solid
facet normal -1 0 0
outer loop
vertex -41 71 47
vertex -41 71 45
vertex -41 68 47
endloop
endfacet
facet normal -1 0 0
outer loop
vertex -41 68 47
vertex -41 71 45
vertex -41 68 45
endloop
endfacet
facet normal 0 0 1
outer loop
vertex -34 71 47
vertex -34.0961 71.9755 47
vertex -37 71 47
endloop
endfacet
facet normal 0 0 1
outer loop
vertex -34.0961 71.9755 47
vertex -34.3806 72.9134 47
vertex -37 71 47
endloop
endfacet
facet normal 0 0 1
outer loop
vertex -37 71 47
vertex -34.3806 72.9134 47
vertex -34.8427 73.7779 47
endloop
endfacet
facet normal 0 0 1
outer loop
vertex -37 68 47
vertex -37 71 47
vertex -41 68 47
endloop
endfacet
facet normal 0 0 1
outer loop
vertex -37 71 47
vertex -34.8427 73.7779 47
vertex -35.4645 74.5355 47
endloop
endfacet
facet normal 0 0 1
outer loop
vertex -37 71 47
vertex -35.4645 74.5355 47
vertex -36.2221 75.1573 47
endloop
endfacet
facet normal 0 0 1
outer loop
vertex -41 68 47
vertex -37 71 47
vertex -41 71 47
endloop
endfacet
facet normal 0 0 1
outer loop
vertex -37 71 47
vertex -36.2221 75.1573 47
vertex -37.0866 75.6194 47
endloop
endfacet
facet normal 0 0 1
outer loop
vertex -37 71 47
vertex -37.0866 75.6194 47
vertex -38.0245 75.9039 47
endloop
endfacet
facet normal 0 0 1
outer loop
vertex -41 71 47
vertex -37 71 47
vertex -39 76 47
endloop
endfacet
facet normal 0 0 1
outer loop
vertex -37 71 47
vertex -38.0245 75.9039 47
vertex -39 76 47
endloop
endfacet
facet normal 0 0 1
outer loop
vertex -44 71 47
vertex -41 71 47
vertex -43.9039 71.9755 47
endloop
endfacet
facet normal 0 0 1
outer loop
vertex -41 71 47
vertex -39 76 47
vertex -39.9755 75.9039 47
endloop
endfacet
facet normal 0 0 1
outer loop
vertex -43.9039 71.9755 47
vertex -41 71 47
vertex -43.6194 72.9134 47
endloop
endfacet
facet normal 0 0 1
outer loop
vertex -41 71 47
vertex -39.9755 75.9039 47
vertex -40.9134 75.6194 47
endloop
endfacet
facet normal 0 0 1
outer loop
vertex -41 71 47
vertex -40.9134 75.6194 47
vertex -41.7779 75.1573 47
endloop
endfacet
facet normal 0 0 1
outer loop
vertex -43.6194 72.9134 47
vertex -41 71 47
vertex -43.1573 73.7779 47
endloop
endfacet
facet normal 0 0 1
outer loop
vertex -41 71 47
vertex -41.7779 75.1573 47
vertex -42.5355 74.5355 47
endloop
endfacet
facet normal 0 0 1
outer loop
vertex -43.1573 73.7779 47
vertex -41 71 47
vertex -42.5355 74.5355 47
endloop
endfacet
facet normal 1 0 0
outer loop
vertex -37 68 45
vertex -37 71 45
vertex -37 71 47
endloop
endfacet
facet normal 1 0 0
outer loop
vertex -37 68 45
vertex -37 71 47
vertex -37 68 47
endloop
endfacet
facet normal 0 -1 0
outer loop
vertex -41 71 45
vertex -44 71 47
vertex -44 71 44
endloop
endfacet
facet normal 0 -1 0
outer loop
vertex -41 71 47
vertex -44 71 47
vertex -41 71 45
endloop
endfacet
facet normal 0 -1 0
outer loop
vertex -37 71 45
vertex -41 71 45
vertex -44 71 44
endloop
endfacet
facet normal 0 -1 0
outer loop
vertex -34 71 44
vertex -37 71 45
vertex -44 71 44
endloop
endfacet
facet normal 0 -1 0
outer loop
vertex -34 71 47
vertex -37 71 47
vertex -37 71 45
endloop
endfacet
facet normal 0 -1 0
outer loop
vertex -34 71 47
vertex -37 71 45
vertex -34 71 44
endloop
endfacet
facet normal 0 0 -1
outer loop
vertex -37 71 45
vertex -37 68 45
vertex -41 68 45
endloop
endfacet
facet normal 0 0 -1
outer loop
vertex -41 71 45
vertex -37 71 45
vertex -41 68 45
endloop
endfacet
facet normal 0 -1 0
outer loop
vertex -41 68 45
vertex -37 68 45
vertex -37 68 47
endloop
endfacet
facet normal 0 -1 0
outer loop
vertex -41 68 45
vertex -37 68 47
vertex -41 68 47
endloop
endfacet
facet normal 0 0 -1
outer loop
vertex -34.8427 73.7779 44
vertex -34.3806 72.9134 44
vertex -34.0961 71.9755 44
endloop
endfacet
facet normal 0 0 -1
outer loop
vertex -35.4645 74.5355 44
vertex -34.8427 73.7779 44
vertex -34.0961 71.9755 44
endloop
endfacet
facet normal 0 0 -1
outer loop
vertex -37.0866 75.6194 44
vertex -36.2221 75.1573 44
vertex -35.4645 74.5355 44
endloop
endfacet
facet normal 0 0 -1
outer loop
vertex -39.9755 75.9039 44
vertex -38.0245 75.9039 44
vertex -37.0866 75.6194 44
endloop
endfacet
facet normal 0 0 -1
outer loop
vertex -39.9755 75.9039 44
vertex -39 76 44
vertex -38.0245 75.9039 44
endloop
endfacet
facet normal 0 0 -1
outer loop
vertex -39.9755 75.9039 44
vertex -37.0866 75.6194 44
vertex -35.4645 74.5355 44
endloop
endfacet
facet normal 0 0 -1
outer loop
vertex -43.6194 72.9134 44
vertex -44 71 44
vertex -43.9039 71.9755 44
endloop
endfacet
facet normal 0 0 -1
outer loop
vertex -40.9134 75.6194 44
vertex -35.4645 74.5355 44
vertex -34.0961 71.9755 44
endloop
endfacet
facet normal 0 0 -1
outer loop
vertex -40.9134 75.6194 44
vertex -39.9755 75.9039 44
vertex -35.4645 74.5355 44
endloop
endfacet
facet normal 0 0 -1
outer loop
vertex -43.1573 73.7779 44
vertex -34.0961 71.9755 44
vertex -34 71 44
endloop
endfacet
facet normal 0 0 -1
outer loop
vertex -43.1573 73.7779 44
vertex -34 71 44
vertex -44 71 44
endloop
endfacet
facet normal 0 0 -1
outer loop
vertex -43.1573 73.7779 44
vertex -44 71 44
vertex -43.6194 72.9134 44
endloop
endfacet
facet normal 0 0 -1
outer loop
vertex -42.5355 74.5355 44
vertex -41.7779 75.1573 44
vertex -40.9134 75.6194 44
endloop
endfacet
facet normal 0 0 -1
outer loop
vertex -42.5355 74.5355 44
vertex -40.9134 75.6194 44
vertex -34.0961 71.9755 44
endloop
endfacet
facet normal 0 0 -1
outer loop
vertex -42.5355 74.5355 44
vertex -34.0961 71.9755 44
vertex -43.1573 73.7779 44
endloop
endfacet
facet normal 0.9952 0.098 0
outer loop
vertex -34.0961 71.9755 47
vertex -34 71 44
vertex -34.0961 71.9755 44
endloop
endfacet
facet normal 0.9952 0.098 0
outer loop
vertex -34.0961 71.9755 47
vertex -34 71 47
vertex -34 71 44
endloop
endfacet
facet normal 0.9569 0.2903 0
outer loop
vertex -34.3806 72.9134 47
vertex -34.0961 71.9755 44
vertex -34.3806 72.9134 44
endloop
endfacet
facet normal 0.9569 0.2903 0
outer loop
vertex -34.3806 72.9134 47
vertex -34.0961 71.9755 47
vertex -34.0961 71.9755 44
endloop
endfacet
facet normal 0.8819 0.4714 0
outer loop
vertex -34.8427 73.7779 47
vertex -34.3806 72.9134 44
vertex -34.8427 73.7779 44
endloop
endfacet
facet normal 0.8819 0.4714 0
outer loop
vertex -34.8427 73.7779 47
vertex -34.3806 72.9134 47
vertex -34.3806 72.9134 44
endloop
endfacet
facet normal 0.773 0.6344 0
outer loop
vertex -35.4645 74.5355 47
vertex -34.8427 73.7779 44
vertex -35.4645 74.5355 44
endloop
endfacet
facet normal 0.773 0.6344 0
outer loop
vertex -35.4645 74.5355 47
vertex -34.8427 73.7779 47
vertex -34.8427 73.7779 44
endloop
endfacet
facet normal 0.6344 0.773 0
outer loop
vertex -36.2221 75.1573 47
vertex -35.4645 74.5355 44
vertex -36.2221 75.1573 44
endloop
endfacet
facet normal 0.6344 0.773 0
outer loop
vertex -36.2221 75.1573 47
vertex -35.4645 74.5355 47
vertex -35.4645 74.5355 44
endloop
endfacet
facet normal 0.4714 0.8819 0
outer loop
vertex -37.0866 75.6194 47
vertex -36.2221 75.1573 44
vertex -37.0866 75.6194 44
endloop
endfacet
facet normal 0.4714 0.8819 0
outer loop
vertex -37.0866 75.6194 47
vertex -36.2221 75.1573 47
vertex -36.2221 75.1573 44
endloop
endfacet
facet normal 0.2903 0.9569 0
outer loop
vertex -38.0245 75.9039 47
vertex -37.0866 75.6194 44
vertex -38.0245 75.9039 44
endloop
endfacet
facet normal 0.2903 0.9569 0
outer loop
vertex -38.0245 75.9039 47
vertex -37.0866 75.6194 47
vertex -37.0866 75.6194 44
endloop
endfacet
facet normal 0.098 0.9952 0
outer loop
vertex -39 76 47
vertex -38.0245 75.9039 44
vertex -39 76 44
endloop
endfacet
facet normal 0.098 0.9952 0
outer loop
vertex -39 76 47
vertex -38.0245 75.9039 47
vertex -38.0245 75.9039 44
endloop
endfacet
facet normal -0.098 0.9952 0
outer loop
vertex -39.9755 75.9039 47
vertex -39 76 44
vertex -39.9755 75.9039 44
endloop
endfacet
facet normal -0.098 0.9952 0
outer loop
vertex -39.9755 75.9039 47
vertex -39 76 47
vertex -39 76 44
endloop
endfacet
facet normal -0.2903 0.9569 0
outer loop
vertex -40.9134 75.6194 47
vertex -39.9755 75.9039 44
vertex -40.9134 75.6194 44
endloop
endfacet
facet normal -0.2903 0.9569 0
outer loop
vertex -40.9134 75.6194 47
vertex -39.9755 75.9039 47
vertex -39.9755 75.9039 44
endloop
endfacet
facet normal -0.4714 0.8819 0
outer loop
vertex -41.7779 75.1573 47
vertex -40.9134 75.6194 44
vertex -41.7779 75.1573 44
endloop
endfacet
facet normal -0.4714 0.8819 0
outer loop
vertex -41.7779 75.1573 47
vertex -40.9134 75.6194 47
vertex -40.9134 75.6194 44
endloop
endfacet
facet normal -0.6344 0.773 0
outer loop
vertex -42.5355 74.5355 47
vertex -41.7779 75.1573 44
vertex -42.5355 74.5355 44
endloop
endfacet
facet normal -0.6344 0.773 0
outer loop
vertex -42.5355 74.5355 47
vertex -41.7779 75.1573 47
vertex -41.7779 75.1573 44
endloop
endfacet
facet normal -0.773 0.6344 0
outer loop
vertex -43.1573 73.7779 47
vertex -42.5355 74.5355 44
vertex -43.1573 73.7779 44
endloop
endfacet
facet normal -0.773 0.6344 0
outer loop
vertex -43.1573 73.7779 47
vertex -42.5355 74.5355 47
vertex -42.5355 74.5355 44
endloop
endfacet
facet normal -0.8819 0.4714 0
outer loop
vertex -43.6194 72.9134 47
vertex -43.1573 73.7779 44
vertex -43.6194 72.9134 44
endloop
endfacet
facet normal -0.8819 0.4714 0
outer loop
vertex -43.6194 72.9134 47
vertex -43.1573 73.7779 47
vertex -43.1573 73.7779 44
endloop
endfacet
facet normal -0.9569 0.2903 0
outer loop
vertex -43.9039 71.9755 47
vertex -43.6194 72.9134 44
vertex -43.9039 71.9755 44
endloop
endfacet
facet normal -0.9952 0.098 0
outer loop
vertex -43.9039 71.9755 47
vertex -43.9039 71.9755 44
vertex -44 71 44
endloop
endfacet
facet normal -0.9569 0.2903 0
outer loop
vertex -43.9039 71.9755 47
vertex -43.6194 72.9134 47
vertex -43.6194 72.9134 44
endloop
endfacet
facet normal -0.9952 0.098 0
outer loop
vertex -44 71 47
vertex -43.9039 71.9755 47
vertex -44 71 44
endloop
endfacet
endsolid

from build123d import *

# Parameters (mm, degrees)
CYLINDER048_W                = 5
CYLINDER048_H                = 3
CYLINDER048_ANGLE            = 180
BOX044_W                     = 4
BOX044_H                     = 5
BOX044_DEPTH                 = 2
FUSION002025_PLACEMENT_ANGLE = 180


with BuildPart() as cilindro048:
    # Cylinder048 → Cylinder048 (revolve)
    with BuildSketch(Plane(origin=(-39, 48, 44), x_dir=(-1, 0, 0), z_dir=(0, 1, 0))):
        with Locations((2.5, 1.5)):
            Rectangle(CYLINDER048_W, CYLINDER048_H)
    revolve(axis=Axis((-39, 48, 44), (0, 0, 1)), revolution_arc=CYLINDER048_ANGLE)


with BuildPart() as fusion002025:
    # Box044 → Box044 (new body)
    with BuildSketch(Plane(origin=(-41, 46, 45), x_dir=(1, 0, 0), z_dir=(0, 0, 1))):
        with Locations((2, 2.5)):
            Rectangle(BOX044_W, BOX044_H)
    extrude(amount=BOX044_DEPTH)

    # Fusion002025: union Cilindro048
    add(cilindro048.part)


with BuildPart() as fusion002025_1:
    # Fusion002025 placement: moved
    add(fusion002025.part.moved(Location((-78, 119, 0))).rotate(Axis((-78, 119, 0), (0, 0, 1)), FUSION002025_PLACEMENT_ANGLE))


solid = fusion002025_1.part
